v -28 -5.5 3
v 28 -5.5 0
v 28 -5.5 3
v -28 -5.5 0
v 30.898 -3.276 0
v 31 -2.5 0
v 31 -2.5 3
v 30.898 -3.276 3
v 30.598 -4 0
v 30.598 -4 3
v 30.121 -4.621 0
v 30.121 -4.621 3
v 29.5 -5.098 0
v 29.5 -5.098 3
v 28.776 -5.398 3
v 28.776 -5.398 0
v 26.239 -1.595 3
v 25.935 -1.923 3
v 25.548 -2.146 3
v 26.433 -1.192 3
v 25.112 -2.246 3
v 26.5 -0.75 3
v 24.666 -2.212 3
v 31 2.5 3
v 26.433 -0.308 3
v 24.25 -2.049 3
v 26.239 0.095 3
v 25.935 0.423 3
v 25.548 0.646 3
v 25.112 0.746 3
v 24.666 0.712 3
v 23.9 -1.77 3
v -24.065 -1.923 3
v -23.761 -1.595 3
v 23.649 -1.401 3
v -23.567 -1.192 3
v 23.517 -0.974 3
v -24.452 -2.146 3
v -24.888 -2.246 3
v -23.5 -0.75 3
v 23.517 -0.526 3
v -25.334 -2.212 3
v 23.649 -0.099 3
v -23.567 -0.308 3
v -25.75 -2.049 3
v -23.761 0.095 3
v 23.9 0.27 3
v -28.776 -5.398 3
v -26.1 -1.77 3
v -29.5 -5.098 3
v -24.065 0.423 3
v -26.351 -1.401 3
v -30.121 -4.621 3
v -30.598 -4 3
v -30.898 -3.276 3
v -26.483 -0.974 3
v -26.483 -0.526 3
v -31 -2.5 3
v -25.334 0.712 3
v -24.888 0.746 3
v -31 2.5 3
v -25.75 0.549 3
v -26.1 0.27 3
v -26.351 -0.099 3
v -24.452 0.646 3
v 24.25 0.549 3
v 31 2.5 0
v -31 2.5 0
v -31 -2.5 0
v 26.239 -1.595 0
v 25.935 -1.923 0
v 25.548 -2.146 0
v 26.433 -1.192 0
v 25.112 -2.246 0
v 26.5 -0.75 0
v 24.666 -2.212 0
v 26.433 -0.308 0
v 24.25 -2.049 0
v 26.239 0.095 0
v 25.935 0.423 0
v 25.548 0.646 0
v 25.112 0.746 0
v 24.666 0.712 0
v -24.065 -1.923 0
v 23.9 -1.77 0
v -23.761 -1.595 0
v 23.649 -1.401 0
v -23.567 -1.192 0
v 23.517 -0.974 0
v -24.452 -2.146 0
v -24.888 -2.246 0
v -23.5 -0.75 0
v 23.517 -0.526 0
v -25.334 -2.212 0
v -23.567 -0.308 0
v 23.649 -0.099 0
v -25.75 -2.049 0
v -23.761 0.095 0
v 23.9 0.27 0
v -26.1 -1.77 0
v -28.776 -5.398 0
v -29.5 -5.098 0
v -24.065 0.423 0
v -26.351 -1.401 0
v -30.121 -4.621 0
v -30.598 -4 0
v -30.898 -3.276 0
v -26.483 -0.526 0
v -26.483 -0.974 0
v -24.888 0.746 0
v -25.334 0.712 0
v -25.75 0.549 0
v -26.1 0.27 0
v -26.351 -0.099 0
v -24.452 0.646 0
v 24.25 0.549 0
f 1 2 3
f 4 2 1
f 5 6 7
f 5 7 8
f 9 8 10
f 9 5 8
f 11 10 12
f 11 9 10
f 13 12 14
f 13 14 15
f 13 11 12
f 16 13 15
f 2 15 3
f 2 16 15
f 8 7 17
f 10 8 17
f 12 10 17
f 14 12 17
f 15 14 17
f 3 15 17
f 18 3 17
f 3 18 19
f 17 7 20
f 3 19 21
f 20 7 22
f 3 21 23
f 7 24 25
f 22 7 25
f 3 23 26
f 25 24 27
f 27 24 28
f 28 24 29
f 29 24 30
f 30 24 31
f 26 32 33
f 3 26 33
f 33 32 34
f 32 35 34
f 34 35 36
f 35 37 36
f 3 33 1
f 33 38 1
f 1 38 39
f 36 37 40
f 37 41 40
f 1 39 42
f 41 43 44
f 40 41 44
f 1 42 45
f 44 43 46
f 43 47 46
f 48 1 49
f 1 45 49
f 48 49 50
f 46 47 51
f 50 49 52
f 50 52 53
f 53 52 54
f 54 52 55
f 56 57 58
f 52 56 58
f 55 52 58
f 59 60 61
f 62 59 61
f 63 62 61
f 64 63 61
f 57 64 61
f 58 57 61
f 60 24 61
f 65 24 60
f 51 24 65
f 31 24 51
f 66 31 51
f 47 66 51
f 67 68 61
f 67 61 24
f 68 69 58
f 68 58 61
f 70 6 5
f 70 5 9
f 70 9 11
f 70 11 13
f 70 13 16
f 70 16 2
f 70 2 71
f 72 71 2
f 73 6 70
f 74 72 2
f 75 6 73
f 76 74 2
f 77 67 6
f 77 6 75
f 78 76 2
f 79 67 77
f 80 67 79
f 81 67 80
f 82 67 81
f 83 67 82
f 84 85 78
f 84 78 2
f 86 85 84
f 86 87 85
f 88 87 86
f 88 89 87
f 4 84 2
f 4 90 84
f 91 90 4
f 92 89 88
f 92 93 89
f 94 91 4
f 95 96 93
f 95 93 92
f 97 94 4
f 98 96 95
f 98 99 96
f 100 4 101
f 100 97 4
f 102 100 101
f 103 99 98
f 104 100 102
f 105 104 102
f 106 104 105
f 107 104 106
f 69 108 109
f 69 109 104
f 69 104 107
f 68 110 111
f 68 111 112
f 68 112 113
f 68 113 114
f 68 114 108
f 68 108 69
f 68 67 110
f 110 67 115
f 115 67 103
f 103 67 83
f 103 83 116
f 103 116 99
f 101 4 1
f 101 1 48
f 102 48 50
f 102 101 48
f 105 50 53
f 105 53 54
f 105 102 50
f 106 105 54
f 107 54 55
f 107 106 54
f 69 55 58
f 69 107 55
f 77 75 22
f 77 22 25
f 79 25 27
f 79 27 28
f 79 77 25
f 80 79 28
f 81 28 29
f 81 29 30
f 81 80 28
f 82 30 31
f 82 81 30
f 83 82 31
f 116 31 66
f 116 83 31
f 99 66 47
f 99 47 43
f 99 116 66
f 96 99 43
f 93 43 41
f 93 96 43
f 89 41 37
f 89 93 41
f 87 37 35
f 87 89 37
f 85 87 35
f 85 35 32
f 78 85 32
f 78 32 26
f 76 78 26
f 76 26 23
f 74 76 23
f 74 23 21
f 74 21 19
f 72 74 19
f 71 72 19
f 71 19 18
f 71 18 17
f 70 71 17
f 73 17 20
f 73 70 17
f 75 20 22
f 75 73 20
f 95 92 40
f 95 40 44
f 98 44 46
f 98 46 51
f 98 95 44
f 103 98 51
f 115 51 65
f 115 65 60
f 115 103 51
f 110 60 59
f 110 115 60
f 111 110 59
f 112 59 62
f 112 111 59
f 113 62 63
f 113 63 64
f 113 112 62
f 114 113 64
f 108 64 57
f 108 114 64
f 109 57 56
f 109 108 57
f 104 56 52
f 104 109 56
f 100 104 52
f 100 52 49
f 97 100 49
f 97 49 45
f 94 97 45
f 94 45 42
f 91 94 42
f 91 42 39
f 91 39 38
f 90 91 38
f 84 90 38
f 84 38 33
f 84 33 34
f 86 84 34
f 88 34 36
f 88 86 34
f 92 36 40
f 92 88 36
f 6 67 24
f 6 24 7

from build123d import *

# Parameters (mm, degrees)
SKETCH1_R           = 1.5
BOSS_EXTRUDE1_DEPTH = 3


with BuildPart() as part:
    # Sketch1 → Boss-Extrude1 (new body)
    with BuildSketch(Plane.XY):
        with BuildLine():
            Line((-31, 2.5), (31, 2.5))
            Line((31, 2.5), (31, -2.5))
            ThreePointArc((31, -2.5), (30.121320344, -4.621320344), (28, -5.5))
            Line((28, -5.5), (-28, -5.5))
            ThreePointArc((-28, -5.5), (-30.121320344, -4.621320344), (-31, -2.5))
            Line((-31, -2.5), (-31, 2.5))
        make_face()
        with Locations((-25, -0.75)):
            Circle(SKETCH1_R, mode=Mode.SUBTRACT)
        with Locations((25, -0.75)):
            Circle(SKETCH1_R, mode=Mode.SUBTRACT)
    extrude(amount=BOSS_EXTRUDE1_DEPTH)


solid = part.part
